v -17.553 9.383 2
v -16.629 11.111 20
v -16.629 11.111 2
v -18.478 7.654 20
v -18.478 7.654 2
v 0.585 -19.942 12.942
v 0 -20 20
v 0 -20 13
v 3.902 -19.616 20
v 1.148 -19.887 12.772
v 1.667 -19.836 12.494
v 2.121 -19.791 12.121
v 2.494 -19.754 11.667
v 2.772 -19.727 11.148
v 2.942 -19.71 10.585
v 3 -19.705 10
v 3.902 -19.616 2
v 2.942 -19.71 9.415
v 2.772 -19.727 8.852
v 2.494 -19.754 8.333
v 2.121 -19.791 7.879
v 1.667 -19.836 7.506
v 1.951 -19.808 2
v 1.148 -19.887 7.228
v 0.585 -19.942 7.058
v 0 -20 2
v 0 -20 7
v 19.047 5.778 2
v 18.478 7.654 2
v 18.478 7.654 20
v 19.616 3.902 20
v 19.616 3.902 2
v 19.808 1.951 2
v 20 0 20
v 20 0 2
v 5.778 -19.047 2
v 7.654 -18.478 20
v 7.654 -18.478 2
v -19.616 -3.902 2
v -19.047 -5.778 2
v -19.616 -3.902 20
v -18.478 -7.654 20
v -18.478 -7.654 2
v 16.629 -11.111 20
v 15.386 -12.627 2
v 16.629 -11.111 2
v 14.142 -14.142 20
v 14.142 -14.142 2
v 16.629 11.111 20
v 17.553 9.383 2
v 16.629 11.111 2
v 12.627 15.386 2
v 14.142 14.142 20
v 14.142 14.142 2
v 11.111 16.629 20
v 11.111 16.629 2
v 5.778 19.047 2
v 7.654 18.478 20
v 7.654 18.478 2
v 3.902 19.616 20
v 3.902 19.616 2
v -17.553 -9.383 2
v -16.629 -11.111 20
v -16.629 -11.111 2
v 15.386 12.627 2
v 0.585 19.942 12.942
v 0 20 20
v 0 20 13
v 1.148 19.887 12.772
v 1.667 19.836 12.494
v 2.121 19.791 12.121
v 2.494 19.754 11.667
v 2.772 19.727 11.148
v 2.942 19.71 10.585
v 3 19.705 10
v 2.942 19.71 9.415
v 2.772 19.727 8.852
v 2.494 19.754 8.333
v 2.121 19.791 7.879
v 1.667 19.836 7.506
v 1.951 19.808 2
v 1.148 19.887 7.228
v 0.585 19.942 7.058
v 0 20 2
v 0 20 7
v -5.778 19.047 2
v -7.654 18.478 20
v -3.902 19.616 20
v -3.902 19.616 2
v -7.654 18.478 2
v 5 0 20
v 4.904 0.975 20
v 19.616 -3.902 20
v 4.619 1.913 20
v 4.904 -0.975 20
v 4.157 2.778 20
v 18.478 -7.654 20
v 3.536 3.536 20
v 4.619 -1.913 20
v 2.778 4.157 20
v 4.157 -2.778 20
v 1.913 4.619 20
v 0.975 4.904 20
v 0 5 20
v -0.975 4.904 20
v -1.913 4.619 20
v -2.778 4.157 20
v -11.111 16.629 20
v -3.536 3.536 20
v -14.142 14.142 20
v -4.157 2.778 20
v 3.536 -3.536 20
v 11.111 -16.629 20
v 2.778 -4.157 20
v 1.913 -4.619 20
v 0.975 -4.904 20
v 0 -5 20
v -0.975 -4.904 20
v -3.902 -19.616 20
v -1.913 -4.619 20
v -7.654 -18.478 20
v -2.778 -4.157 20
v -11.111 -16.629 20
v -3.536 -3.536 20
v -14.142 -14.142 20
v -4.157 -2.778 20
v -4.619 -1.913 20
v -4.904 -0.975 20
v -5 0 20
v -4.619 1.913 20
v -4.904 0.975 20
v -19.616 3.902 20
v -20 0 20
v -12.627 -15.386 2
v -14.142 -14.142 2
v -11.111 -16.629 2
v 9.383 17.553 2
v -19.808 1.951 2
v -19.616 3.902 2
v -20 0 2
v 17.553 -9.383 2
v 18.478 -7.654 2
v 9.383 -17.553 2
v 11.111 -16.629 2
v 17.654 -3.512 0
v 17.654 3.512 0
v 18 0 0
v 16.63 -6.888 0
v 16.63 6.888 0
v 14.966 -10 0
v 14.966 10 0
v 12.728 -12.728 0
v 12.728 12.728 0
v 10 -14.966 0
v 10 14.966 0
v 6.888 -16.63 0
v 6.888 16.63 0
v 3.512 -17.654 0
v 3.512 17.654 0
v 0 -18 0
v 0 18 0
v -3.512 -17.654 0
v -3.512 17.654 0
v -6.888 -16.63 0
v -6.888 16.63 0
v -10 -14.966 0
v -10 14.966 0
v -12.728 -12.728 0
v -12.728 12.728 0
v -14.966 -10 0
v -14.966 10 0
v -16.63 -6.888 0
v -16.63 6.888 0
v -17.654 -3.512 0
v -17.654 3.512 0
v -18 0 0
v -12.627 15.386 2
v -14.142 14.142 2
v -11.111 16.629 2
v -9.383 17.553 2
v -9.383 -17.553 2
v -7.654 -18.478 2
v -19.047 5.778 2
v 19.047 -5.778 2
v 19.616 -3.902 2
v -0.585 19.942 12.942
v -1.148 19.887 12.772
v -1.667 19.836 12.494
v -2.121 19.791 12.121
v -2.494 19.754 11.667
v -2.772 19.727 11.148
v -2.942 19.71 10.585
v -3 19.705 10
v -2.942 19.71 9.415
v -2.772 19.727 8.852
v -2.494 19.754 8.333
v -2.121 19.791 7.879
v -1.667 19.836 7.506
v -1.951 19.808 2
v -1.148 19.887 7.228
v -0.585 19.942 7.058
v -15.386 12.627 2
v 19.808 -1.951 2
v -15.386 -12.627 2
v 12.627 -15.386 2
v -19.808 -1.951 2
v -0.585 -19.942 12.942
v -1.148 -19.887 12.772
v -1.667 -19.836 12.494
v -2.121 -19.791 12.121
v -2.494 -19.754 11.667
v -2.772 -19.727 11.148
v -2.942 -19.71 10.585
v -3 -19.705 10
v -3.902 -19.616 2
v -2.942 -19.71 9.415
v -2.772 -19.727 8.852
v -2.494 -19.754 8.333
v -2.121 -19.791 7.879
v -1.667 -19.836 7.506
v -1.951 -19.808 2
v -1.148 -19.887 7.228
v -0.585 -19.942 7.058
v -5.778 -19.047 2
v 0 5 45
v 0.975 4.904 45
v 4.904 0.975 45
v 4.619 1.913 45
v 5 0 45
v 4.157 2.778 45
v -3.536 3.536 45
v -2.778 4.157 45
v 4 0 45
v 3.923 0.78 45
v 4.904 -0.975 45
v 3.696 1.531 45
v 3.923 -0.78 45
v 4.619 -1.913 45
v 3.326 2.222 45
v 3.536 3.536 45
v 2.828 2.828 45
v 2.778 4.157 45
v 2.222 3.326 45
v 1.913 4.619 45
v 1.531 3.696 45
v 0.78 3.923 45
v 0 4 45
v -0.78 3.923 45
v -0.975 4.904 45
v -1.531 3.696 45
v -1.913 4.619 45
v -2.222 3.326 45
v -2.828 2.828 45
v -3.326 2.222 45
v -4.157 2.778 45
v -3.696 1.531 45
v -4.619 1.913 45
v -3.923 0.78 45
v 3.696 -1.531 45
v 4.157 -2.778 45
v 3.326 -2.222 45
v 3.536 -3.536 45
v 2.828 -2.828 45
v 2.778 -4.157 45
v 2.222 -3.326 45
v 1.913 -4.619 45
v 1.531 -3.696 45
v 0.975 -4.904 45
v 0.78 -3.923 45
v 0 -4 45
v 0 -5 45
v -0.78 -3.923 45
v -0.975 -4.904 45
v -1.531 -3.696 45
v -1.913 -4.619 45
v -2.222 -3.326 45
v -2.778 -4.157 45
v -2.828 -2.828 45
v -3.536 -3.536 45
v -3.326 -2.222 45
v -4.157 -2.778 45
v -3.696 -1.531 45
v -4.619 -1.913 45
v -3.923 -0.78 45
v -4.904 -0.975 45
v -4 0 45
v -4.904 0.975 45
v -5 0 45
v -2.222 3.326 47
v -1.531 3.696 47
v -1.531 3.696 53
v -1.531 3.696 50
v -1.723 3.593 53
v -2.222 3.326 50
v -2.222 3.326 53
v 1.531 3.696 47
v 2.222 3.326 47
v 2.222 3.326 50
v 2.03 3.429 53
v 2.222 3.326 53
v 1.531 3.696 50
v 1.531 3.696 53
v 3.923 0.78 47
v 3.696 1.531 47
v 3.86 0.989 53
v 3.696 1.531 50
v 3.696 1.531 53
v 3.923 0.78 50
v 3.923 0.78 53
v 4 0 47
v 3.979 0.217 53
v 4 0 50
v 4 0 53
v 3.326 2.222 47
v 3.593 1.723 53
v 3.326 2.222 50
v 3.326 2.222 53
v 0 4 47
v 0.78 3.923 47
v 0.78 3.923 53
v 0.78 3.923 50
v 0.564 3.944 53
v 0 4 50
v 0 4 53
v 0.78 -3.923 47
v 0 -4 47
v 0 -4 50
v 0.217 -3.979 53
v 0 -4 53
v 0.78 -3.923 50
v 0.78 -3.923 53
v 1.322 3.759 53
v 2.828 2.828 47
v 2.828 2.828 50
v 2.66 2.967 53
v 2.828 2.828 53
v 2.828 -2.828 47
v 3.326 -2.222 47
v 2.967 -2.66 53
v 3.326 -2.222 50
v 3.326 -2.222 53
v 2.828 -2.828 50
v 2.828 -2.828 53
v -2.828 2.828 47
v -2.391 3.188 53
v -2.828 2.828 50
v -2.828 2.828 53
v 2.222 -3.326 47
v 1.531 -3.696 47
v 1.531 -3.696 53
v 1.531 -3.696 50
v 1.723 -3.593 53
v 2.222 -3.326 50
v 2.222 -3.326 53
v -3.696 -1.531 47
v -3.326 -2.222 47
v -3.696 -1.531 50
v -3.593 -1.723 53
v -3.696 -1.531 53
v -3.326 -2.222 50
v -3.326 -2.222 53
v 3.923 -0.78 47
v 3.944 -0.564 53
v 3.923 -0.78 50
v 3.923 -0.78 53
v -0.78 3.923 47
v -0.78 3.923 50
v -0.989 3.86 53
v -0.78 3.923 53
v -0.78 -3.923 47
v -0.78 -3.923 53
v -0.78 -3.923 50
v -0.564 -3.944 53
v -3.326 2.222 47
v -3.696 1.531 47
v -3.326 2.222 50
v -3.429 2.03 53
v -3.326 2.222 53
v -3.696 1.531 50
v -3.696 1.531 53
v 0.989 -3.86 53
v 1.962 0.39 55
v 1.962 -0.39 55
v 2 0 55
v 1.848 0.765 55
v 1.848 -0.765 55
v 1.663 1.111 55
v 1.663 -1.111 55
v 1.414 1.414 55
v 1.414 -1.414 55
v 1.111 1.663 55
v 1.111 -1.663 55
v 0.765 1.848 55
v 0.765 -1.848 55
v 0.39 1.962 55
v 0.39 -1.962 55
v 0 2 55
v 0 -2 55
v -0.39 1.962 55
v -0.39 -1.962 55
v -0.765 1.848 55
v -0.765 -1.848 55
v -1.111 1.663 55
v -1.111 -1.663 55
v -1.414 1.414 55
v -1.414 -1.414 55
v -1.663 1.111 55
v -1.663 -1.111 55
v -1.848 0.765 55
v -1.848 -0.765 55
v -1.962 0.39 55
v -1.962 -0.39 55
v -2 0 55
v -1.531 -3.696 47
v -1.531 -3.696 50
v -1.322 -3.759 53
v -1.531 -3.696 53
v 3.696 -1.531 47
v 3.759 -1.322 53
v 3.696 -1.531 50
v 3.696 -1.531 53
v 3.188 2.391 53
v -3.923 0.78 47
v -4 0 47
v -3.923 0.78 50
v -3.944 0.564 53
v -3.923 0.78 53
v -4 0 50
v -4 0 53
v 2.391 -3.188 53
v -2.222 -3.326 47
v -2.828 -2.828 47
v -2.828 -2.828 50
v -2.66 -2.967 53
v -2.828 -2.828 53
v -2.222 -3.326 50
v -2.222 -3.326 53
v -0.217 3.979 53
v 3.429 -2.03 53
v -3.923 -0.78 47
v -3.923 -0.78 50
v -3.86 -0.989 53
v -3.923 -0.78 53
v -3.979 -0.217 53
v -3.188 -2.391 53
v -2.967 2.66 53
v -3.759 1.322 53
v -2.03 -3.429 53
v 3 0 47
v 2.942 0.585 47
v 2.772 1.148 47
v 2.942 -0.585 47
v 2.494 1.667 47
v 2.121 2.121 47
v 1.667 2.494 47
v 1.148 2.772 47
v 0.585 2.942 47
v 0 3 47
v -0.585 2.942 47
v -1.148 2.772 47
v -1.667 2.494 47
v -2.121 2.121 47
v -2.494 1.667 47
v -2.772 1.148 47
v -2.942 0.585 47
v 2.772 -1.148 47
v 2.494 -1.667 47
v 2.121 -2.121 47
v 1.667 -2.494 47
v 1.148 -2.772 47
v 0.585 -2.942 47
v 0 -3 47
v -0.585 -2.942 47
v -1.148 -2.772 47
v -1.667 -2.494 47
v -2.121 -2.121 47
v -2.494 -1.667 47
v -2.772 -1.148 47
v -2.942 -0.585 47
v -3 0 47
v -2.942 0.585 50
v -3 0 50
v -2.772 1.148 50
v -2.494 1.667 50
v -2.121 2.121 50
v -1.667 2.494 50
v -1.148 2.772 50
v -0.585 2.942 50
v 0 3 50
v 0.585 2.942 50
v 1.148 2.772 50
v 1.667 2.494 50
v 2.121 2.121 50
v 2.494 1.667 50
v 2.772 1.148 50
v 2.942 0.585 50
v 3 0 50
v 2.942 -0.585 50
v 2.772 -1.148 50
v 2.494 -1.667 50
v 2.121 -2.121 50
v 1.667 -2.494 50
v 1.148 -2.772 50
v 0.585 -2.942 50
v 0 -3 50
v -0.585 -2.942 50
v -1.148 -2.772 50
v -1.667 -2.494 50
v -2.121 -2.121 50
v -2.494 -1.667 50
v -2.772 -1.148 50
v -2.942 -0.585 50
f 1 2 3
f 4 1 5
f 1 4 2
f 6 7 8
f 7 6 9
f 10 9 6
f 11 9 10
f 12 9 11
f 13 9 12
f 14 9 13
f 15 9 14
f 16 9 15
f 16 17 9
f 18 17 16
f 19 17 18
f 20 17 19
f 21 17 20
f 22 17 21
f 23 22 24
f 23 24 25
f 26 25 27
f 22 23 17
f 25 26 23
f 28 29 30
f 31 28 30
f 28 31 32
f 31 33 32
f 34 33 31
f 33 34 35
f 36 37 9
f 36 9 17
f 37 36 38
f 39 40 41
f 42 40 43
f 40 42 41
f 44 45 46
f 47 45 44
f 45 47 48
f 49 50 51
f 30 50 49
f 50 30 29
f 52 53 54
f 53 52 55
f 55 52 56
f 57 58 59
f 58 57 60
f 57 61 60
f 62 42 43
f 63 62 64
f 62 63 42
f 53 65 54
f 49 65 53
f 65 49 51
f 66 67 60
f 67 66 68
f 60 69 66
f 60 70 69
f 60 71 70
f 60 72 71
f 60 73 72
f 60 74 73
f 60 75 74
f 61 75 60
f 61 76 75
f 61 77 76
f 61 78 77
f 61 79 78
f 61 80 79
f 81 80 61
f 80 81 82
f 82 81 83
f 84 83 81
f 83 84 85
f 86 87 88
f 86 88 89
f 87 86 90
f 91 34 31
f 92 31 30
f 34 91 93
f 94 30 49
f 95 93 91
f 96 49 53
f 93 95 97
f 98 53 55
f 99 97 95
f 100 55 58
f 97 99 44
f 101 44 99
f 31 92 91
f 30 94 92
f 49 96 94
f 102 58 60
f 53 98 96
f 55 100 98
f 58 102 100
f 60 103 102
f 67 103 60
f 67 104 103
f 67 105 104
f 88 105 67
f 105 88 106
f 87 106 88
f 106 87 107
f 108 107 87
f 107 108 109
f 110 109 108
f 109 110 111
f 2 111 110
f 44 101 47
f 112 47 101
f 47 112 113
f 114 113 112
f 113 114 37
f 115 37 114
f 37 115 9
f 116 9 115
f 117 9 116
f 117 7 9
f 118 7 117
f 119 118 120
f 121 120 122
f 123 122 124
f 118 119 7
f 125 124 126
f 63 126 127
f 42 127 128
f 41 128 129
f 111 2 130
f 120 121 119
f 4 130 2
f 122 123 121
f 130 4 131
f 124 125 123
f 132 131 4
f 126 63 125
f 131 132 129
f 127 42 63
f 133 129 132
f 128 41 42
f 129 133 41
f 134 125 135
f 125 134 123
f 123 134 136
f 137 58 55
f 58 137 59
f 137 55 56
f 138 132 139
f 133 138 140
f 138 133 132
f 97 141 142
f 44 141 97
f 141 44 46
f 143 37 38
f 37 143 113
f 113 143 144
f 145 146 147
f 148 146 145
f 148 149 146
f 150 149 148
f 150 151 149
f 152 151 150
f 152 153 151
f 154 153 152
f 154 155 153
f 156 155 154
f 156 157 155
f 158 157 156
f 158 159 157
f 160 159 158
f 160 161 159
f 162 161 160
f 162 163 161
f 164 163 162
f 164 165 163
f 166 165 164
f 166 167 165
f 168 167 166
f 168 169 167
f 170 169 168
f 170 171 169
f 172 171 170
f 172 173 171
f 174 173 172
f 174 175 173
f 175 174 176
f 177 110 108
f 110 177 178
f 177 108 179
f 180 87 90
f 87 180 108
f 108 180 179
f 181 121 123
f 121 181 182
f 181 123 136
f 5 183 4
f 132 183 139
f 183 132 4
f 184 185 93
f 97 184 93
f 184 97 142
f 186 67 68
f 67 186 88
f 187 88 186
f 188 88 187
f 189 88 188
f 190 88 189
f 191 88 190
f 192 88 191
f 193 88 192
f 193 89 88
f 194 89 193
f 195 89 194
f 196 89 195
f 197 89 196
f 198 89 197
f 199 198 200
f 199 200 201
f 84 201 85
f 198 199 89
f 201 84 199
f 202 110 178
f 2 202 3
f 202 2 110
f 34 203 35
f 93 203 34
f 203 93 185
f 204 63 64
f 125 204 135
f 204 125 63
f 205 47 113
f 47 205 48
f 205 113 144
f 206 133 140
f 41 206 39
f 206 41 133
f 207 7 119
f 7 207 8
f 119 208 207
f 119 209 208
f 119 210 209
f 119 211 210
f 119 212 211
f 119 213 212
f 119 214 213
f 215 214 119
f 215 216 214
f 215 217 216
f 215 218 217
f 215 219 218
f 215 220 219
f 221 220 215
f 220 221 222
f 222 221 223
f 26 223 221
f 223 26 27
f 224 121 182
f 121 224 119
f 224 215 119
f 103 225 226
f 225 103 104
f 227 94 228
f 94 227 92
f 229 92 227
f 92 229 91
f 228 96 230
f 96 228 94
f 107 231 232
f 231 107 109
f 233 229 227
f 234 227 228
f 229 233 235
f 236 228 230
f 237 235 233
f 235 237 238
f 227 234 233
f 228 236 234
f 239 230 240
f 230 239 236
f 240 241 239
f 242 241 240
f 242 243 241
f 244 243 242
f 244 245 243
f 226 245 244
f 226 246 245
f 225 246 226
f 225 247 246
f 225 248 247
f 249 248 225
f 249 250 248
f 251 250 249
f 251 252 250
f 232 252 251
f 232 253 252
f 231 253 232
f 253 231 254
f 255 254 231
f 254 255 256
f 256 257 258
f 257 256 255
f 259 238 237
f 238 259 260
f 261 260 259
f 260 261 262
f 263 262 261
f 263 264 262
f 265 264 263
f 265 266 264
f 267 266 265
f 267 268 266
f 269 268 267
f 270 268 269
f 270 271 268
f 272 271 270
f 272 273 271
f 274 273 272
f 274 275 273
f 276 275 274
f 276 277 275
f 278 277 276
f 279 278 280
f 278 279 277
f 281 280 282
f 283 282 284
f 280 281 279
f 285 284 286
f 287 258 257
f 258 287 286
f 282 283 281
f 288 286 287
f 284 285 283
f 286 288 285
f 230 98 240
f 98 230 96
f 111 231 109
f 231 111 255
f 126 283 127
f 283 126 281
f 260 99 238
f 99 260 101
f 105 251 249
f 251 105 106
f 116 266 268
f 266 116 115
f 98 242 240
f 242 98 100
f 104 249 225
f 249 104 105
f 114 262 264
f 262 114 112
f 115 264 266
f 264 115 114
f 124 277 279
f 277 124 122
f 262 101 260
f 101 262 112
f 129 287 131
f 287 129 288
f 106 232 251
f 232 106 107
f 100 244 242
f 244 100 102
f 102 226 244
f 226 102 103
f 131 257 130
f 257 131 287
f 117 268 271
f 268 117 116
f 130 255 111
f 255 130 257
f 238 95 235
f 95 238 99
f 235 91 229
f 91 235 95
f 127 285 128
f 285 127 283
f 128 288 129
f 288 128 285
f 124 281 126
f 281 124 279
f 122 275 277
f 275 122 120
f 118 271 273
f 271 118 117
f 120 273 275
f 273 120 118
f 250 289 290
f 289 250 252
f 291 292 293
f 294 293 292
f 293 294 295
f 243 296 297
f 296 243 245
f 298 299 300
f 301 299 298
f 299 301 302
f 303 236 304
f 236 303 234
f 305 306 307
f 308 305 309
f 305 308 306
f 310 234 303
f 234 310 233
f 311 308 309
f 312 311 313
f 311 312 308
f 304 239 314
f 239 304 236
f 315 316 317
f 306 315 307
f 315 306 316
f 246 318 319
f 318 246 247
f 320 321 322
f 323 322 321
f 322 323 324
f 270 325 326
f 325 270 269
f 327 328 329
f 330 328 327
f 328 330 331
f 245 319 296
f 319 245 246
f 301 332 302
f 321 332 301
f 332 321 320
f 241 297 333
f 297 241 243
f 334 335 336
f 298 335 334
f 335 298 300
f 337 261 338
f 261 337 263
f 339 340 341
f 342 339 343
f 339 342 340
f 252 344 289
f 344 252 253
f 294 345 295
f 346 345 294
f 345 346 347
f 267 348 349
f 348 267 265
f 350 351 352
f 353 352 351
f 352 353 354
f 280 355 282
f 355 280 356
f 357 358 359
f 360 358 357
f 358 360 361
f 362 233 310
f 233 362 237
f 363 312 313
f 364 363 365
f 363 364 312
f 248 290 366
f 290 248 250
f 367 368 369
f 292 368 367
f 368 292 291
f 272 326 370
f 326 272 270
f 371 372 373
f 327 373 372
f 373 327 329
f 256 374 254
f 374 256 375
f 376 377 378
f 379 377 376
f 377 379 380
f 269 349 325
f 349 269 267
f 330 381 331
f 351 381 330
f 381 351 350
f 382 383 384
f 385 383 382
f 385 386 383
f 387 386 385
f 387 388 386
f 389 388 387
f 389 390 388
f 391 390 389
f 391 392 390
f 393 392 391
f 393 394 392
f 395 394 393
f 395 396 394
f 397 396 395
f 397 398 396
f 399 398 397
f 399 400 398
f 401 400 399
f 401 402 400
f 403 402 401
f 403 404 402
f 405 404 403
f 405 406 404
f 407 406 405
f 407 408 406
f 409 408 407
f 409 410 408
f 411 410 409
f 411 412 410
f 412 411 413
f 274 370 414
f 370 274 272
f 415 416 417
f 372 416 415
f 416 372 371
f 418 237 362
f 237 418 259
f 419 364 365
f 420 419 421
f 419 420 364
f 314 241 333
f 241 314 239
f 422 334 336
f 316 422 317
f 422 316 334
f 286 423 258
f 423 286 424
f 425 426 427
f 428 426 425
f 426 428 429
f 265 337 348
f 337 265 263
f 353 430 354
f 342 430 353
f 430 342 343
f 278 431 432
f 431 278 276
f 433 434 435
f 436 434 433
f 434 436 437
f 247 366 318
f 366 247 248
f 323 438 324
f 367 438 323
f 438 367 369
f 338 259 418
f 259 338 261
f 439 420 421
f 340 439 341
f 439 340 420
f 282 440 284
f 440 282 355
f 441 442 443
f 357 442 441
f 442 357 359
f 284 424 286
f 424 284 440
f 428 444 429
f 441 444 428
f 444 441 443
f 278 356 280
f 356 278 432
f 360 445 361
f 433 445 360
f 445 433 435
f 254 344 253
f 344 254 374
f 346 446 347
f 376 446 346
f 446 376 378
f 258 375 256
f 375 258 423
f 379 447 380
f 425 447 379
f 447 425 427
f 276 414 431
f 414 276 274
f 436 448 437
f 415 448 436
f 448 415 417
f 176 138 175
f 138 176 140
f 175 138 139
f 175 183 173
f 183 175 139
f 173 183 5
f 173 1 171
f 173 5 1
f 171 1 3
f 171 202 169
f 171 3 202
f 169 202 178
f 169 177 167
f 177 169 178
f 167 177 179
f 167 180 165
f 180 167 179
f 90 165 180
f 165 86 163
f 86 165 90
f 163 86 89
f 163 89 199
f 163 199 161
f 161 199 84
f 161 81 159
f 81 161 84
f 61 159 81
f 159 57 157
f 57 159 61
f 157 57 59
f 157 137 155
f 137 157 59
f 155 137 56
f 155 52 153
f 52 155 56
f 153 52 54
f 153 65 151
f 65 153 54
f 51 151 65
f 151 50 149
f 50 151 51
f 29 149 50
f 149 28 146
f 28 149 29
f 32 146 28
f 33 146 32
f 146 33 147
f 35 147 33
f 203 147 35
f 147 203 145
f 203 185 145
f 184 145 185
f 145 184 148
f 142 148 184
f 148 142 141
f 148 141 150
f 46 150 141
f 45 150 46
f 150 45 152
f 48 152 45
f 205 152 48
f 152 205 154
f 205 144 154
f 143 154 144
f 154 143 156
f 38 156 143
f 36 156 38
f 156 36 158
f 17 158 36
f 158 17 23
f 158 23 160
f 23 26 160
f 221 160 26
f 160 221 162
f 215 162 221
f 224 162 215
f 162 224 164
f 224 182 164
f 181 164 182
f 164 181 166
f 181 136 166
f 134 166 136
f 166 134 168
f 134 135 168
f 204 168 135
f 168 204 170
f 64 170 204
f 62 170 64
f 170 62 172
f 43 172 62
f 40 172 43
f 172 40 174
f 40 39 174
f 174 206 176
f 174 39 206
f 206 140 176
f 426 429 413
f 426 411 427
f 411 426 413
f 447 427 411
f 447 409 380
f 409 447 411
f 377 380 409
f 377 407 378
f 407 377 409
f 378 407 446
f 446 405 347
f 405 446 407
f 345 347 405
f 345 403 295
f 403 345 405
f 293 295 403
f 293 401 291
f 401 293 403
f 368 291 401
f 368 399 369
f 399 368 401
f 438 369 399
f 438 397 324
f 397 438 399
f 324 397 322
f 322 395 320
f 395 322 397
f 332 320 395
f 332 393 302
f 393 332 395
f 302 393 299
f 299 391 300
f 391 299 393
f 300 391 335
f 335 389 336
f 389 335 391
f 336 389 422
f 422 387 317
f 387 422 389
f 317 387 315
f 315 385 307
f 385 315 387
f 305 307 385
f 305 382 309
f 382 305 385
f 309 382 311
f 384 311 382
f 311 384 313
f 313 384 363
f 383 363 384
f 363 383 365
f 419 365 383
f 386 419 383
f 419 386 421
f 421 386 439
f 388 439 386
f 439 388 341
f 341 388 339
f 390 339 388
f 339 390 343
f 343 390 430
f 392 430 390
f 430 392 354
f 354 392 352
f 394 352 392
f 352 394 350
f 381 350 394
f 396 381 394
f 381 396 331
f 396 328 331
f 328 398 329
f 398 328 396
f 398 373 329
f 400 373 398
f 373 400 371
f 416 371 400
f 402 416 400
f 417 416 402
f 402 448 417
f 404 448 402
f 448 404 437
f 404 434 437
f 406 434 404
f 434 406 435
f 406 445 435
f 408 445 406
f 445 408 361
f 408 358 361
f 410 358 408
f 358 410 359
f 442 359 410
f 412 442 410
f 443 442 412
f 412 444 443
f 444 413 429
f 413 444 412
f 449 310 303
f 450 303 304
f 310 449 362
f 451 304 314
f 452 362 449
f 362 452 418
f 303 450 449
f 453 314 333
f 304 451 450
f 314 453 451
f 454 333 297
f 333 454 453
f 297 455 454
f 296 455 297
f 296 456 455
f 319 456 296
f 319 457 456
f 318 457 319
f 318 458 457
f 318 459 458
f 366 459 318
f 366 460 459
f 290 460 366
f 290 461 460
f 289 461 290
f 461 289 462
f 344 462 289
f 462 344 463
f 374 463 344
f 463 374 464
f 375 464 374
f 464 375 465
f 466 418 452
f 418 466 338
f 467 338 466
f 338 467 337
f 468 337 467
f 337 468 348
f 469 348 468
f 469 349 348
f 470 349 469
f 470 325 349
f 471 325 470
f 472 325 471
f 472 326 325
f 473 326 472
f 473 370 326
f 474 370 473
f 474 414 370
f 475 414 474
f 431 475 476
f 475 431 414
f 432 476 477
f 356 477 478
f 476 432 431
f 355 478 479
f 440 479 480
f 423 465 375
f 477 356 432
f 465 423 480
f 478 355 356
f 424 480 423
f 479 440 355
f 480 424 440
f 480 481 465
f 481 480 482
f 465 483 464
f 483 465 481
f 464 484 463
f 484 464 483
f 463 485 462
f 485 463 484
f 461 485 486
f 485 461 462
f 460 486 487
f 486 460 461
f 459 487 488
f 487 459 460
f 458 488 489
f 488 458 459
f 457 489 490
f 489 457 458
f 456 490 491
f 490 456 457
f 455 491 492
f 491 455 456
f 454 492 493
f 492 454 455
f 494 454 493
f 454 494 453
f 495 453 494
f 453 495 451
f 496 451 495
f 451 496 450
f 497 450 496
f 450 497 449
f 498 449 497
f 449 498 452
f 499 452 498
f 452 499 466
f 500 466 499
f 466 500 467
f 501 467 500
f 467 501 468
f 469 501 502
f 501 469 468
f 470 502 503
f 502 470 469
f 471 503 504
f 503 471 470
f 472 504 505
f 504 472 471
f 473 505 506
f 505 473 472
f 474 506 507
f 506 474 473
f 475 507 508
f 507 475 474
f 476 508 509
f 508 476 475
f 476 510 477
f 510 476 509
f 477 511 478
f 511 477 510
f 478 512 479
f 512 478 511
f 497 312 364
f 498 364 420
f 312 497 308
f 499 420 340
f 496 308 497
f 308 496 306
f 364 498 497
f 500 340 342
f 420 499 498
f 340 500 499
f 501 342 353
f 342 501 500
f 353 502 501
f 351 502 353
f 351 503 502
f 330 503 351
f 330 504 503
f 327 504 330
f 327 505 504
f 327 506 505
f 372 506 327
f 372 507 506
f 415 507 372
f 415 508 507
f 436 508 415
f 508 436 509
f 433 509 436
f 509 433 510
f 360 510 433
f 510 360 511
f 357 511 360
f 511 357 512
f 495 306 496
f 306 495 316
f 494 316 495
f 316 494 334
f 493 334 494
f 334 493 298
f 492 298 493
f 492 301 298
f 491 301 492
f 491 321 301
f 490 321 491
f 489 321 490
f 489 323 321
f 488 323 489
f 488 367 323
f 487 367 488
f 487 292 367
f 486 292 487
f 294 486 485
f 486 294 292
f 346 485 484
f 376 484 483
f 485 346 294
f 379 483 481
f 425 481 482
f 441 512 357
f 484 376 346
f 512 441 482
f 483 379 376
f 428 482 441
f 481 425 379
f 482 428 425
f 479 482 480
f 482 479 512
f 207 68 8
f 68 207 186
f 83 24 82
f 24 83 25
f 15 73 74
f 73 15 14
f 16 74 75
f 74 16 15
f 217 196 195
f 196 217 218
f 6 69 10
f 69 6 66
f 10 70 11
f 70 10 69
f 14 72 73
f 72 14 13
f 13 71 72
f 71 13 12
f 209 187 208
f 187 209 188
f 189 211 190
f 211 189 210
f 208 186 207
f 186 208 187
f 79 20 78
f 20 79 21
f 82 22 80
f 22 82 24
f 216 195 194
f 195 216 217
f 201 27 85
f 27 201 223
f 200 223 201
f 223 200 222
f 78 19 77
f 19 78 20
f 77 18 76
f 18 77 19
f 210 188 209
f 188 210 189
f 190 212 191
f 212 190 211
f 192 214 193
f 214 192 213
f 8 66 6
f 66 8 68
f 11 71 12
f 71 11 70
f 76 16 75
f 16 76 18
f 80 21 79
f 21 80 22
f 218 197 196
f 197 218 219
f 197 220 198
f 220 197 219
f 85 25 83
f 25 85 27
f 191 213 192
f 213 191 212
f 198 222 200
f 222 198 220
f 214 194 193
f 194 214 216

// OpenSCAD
$fn = 32;
// ----------------------------------------------------------------------
// Stepped shaft: diameters 40, 10, 8 mm, 55 mm long
// ----------------------------------------------------------------------

// --- parameters (mm) ---
d1 = 40;                  // step 1 diameter
len1 = 20;                // step 1 length
d2 = 10;                  // step 2 diameter
len2 = 25;                // step 2 length
d3 = 8;                   // step 3 diameter
len3 = 10;                // step 3 length
total = 55;               // overall length
chamfer = 2;              // end chamfer
groove_r = 4;             // groove radius
groove_z = 47;            // groove position from the end
groove_w = 3;             // groove width
groove_d = 1;             // groove depth
cross_d = 6;              // cross pin hole
cross_z = 10;             // cross hole position

difference() {
  /* turned body: stacked cylinders, every step sunk into the bigger one */
  union() {
    cylinder(h = len1, d = d1);
    translate([0, 0, 19.6]) cylinder(h = 25.4, d = d2);
    translate([0, 0, 44.6]) cylinder(h = 10.4, d = d3);
  }
  /* bottom chamfer ring cut */
  rotate_extrude() translate([18, -2.5]) polygon([[0, 0], [4.5, 0], [4.5, 7], [0, 2.5]]);
  /* top chamfer ring cut */
  rotate_extrude() translate([2, 55]) polygon([[0, 0], [4.5, -4.5], [4.5, 2.5], [0, 2.5]]);
  /* circlip groove just behind the shoulder */
  rotate_extrude() translate([groove_r - groove_d, groove_z]) square([groove_d + 2.5, groove_w]);
  /* cross pin hole through the small step */
  translate([0, 0, cross_z]) rotate([90, 0, 0]) cylinder(h = d1 + 5, d = cross_d, center = true);
}
